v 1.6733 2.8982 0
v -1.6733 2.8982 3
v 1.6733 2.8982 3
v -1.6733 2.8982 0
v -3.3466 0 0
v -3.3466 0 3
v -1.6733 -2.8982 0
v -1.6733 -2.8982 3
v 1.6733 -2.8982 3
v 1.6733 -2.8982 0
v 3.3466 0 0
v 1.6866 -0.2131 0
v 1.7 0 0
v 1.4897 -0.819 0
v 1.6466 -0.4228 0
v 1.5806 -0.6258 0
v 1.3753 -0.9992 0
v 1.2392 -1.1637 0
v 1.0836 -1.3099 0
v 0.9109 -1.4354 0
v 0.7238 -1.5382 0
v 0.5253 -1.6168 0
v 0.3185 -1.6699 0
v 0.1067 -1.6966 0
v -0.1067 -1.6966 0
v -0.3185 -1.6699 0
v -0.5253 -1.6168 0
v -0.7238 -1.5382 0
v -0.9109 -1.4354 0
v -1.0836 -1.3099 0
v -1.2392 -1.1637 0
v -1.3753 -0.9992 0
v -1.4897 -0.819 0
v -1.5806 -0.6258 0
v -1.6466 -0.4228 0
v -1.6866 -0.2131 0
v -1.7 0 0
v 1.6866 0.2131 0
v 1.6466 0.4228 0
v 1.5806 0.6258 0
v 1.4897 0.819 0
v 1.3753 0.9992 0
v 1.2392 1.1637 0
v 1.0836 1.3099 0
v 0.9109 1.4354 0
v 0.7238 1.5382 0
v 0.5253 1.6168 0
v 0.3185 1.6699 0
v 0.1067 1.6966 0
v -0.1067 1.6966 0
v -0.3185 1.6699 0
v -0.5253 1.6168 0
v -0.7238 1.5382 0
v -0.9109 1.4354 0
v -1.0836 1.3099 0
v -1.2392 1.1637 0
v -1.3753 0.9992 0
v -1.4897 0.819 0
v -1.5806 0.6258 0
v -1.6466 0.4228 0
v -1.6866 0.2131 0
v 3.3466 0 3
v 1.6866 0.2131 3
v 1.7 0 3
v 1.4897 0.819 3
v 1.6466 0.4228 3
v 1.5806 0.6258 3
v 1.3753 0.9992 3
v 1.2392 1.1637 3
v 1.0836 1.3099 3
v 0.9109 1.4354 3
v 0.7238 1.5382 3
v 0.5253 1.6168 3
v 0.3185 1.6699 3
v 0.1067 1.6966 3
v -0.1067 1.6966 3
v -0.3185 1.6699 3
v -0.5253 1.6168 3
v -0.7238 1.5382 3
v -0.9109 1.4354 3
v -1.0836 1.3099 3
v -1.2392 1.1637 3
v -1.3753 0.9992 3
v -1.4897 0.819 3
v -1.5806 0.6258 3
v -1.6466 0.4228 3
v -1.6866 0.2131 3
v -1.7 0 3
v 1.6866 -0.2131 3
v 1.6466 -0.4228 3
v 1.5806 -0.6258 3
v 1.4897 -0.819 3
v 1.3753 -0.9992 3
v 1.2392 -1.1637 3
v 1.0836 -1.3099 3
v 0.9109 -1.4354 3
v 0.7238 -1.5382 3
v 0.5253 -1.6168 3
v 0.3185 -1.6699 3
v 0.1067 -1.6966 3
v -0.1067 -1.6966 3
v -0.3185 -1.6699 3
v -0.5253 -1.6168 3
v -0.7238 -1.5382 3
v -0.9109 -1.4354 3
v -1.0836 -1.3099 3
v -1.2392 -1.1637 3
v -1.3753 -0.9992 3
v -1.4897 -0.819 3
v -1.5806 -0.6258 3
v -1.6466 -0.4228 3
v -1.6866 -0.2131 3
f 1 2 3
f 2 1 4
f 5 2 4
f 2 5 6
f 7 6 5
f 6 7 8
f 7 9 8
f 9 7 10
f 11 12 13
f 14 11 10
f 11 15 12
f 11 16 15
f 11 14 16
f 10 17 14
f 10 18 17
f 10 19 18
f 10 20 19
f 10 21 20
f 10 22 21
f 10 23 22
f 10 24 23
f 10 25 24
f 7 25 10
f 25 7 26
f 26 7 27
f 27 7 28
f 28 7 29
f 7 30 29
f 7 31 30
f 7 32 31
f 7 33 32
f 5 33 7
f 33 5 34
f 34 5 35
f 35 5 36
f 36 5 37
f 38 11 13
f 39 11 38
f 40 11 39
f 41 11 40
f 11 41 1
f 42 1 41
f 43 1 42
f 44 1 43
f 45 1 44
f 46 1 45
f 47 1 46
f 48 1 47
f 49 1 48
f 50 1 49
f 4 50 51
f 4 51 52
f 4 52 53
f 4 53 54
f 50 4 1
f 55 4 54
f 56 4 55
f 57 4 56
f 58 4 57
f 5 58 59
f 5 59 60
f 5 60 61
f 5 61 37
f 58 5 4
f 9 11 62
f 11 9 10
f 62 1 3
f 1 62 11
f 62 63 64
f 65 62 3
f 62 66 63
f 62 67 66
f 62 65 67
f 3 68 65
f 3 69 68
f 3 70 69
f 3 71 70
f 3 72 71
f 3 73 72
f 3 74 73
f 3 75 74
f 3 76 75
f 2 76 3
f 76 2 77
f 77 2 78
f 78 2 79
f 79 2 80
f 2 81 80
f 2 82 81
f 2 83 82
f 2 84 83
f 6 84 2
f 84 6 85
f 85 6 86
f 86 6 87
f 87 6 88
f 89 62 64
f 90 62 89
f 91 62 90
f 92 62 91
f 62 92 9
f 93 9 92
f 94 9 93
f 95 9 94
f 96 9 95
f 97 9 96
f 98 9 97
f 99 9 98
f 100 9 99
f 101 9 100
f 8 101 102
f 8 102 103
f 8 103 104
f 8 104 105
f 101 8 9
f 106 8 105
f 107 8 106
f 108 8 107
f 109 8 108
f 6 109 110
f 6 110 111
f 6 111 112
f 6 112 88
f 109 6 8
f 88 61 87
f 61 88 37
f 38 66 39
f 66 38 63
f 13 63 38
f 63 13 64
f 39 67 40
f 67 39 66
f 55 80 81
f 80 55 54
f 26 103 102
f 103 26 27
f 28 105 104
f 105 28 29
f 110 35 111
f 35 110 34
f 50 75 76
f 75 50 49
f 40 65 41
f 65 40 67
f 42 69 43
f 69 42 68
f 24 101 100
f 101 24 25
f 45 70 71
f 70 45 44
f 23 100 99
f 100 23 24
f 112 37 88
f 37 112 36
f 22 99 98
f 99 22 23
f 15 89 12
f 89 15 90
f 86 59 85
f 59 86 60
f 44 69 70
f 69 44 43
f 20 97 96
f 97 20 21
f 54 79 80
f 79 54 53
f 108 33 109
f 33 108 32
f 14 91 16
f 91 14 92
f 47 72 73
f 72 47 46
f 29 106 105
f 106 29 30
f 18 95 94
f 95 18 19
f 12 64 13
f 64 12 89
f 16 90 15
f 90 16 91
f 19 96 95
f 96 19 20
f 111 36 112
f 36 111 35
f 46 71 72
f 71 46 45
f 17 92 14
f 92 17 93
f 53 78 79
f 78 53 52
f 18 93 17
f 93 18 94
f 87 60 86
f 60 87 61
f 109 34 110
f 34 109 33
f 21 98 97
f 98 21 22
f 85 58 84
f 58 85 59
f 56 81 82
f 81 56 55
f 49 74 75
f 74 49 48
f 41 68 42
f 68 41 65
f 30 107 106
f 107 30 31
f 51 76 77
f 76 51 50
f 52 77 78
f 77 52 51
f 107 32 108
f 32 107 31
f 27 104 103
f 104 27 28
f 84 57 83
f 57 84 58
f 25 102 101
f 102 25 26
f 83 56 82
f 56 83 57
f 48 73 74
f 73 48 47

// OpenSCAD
$fn = 50;


difference() {
	union() {
		translate(v = [0, 0, 0]) {
			rotate(a = [0, 0, 0]) {
				translate(v = [0, 0, 0]) {
					rotate(a = [0, 0, 0]) {
						linear_extrude(height = 3) {
							polygon(points = [[3.3466000000, 0.0000000000], [1.6733000000, 2.8982406163], [-1.6733000000, 2.8982406163], [-3.3466000000, 0.0000000000], [-1.6733000000, -2.8982406163], [1.6733000000, -2.8982406163]]);
						}
					}
				}
			}
		}
	}
	union() {
		translate(v = [0, 0, -10]) {
			rotate(a = [0, 0, 0]) {
				cylinder(h = 20, r = 1.7000000000);
			}
		}
	}
}
